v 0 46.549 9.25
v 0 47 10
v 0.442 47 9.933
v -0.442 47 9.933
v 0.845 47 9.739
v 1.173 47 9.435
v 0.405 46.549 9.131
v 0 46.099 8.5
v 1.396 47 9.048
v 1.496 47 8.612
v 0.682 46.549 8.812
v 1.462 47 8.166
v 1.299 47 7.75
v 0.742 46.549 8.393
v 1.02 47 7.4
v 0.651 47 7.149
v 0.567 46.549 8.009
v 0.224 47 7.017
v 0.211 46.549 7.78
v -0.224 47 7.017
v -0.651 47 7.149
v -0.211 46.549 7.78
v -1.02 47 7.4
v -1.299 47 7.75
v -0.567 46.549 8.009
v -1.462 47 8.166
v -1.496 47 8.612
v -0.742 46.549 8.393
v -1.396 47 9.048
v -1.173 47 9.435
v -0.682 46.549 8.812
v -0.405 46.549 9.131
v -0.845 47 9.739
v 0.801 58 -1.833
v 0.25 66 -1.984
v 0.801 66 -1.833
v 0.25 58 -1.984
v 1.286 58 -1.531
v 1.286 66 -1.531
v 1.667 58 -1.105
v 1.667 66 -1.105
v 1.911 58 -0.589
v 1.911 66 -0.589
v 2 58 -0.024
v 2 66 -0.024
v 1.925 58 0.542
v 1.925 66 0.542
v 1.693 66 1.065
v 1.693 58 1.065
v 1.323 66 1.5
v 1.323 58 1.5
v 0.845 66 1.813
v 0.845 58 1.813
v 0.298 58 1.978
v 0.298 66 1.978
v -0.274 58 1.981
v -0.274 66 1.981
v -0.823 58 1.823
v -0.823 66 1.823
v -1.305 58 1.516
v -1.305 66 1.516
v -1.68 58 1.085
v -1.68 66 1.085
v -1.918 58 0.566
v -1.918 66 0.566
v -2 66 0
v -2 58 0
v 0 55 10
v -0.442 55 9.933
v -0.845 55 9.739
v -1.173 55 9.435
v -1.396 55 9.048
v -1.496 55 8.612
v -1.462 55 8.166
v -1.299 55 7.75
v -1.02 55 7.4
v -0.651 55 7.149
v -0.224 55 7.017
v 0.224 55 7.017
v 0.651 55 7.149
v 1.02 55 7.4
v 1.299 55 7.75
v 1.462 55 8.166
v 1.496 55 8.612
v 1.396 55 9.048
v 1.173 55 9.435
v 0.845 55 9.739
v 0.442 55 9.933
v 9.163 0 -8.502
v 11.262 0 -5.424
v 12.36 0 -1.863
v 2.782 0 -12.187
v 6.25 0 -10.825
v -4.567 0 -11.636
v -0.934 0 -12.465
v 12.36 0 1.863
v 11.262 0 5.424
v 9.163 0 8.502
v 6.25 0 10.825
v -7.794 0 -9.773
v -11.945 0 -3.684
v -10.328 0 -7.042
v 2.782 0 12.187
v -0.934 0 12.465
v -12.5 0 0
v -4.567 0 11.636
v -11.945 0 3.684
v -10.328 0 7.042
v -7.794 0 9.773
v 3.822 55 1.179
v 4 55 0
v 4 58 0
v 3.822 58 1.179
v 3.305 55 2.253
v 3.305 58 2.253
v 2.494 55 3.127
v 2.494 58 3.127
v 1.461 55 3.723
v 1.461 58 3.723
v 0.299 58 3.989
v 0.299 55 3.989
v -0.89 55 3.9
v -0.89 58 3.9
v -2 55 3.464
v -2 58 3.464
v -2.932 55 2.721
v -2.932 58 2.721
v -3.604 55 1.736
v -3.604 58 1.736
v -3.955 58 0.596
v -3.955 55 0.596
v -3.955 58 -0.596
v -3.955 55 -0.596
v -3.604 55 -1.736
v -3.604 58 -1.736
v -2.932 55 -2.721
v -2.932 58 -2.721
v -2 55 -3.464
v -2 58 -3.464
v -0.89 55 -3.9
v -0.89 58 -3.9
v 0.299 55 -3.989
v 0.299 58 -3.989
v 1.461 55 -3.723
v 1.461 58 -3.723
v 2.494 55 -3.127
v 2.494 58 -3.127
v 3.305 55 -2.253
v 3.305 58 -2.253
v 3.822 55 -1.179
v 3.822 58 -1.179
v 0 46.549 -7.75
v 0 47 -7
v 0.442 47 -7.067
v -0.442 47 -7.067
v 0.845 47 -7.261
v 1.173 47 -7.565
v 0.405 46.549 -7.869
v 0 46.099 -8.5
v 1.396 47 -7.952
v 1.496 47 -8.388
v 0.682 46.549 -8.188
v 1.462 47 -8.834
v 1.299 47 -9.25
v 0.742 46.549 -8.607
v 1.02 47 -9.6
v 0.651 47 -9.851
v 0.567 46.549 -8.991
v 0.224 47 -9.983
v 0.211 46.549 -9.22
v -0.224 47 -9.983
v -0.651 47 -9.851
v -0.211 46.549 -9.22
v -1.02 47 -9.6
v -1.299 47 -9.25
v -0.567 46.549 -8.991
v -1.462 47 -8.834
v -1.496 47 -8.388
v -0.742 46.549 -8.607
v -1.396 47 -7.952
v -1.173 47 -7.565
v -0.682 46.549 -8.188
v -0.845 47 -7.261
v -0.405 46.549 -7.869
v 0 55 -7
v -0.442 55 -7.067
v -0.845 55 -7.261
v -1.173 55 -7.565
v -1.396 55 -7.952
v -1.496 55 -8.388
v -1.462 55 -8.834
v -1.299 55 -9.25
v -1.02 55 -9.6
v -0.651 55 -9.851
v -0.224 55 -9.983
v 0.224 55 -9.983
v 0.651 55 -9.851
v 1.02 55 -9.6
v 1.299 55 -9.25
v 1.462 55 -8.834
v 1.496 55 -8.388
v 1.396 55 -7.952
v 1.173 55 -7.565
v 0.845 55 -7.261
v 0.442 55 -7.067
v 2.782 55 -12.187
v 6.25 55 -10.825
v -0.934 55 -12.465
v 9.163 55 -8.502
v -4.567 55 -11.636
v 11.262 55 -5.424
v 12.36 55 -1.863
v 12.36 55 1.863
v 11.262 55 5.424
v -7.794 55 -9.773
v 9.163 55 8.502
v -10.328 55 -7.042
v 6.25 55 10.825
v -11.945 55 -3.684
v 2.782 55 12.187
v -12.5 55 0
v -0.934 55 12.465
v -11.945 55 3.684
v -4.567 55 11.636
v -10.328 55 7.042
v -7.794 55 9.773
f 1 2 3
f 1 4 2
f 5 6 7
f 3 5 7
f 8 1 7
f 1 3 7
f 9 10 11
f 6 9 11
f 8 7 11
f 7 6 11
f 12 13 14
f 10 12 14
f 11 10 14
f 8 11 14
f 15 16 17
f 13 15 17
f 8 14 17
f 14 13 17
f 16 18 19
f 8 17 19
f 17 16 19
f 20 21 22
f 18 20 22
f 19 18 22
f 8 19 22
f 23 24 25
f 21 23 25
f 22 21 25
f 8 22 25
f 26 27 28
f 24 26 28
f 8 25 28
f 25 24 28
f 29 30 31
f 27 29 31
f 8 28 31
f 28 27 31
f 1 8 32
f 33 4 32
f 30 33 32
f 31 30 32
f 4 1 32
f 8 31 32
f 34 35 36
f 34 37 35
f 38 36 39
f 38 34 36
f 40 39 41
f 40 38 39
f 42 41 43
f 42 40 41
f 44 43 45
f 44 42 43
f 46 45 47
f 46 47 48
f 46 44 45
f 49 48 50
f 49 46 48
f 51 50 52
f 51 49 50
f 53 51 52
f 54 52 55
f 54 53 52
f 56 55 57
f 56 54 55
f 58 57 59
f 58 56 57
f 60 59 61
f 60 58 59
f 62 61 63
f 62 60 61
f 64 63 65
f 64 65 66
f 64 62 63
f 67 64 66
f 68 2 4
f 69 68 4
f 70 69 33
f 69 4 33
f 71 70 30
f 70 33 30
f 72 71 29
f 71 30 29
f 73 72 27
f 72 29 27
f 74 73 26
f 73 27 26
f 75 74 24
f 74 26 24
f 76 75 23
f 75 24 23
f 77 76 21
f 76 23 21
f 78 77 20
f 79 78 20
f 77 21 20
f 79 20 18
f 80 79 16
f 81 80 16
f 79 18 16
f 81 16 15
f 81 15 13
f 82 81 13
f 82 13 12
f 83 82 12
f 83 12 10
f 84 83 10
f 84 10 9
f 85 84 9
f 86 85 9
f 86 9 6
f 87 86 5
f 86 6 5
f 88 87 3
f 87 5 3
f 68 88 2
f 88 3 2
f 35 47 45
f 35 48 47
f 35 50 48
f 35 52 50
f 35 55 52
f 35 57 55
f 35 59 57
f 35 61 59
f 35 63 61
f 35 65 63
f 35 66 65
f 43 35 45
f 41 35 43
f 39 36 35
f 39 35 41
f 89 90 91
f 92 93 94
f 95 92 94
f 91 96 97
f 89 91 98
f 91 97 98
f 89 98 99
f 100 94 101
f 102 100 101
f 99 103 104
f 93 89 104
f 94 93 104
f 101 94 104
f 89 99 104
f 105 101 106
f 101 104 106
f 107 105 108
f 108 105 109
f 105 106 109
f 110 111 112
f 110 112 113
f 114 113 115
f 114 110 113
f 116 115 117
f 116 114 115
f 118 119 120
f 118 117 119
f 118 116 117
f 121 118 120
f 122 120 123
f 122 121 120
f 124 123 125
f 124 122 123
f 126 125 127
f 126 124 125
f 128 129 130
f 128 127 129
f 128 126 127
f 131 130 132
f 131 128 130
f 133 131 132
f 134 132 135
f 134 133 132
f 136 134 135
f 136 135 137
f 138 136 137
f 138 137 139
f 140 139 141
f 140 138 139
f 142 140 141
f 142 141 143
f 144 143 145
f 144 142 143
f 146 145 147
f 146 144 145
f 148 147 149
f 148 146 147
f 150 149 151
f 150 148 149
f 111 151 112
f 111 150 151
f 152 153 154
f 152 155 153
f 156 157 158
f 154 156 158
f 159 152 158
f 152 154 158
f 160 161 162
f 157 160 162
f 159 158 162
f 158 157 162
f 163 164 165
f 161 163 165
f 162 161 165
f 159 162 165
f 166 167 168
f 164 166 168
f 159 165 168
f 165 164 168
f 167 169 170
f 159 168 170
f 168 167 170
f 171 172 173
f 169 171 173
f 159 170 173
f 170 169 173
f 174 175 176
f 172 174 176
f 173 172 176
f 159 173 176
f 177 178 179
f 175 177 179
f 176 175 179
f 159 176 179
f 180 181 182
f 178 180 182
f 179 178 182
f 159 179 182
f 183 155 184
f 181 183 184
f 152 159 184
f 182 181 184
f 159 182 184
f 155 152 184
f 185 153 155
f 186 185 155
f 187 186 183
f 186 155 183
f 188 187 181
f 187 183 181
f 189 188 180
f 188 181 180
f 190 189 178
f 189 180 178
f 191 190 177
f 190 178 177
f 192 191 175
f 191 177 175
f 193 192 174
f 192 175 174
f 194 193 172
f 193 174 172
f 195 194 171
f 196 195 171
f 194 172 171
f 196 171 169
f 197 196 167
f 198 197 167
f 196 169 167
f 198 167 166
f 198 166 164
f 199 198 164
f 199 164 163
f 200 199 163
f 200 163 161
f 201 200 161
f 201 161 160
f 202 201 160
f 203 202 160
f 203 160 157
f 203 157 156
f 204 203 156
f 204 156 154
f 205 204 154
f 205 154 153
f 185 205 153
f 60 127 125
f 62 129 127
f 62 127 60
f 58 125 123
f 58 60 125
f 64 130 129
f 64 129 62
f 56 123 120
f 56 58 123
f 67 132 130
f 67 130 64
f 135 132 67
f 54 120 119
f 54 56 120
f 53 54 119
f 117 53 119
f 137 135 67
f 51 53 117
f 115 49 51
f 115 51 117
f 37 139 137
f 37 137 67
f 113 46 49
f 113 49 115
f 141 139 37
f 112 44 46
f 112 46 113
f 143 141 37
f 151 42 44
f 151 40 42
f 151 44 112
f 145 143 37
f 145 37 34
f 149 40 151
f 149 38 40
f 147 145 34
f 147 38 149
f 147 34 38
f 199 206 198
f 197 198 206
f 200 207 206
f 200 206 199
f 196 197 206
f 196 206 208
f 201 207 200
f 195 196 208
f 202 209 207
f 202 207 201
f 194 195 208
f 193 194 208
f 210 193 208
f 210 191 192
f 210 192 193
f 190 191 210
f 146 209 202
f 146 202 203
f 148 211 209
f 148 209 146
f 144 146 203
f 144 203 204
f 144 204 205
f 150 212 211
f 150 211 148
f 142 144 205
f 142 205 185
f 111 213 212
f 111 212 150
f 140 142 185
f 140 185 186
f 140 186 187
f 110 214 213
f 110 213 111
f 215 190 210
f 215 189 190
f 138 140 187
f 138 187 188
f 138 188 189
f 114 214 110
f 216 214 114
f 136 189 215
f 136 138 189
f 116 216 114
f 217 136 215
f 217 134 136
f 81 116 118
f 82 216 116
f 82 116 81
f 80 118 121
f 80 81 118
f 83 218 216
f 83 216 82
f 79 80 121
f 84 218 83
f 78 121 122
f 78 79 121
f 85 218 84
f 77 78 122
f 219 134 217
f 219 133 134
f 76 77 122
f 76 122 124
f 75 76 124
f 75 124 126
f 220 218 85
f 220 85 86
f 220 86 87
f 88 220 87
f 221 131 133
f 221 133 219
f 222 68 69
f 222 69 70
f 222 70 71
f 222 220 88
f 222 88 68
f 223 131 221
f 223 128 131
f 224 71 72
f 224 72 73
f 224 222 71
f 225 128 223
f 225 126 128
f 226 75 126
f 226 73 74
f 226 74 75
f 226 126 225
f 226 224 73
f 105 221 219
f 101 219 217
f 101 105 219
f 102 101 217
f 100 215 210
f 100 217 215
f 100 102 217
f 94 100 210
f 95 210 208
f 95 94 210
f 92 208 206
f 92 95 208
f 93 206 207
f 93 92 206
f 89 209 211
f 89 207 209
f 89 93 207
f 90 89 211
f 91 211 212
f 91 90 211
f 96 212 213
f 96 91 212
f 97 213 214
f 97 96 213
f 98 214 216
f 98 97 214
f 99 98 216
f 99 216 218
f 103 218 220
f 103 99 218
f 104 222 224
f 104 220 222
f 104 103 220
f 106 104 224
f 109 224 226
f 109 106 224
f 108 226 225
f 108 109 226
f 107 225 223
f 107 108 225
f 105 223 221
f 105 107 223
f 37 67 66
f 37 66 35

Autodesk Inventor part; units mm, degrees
ref_plane "XZ Plane" through (0, 0, 0) normal (0, 1, 0) x (-1, 0, 0)
sketch "Sketch1" plane through (0, 0, 0) normal (0, 1, 0) x (-1, 0, 0)
  circle A0 centre (0, 0) radius 12.5
  dimension "d0" = 25
extrude "Extrusion1" add sketch "Sketch1" along normal blind 55
sketch "Sketch2" plane through (0, 55, 0) normal (0, 1, 0) x (1, 0, 0)
  circle A0 centre (0, 0) radius 12.5 projected
  circle A1 centre (0, 0) radius 4
  dimension "d3" = 8
extrude "Extrusion2" add sketch "Sketch2" along normal blind 3 contours A1
sketch "Sketch3" plane through (0, 58, 0) normal (0, 1, 0) x (1, 0, 0)
  circle A0 centre (0, 0) radius 4 projected
  circle A1 centre (0, 0) radius 2
  line L0 (-2, 0) -> (0.25, 1.9843)
  line L1 (-17.5, 0) -> (17.5, 0) projected
  dimension "d6" = 4
  dimension "d7" = 3
extrude "Extrusion3" add sketch "Sketch3" along normal blind 8 contours L1 L0 A1 | A1 L1
sketch "Sketch4" plane through (0, 55, 0) normal (0, 1, 0) x (1, 0, 0)
  circle A0 centre (0, 0) radius 4 projected
  circle A1 centre (0, 0) radius 12.5 projected
  circle A2 centre (0, 0) radius 8.5 construction
  line L0 (-17.5, 0) -> (17.5, 0) construction
  line L1 (0, 17.5) -> (0, -17.5) construction
  point P0 (0, -8.5)
  point P1 (0, 8.5)
  dimension "d10" = 17
hole "Hole1" at (0, 55, -8.5) at (0, 55, 8.5) direction (0, -1, 0) diameter 3 depth 8 tip angle 118
properties part number "motor_small" material "Iron, Malleable"
